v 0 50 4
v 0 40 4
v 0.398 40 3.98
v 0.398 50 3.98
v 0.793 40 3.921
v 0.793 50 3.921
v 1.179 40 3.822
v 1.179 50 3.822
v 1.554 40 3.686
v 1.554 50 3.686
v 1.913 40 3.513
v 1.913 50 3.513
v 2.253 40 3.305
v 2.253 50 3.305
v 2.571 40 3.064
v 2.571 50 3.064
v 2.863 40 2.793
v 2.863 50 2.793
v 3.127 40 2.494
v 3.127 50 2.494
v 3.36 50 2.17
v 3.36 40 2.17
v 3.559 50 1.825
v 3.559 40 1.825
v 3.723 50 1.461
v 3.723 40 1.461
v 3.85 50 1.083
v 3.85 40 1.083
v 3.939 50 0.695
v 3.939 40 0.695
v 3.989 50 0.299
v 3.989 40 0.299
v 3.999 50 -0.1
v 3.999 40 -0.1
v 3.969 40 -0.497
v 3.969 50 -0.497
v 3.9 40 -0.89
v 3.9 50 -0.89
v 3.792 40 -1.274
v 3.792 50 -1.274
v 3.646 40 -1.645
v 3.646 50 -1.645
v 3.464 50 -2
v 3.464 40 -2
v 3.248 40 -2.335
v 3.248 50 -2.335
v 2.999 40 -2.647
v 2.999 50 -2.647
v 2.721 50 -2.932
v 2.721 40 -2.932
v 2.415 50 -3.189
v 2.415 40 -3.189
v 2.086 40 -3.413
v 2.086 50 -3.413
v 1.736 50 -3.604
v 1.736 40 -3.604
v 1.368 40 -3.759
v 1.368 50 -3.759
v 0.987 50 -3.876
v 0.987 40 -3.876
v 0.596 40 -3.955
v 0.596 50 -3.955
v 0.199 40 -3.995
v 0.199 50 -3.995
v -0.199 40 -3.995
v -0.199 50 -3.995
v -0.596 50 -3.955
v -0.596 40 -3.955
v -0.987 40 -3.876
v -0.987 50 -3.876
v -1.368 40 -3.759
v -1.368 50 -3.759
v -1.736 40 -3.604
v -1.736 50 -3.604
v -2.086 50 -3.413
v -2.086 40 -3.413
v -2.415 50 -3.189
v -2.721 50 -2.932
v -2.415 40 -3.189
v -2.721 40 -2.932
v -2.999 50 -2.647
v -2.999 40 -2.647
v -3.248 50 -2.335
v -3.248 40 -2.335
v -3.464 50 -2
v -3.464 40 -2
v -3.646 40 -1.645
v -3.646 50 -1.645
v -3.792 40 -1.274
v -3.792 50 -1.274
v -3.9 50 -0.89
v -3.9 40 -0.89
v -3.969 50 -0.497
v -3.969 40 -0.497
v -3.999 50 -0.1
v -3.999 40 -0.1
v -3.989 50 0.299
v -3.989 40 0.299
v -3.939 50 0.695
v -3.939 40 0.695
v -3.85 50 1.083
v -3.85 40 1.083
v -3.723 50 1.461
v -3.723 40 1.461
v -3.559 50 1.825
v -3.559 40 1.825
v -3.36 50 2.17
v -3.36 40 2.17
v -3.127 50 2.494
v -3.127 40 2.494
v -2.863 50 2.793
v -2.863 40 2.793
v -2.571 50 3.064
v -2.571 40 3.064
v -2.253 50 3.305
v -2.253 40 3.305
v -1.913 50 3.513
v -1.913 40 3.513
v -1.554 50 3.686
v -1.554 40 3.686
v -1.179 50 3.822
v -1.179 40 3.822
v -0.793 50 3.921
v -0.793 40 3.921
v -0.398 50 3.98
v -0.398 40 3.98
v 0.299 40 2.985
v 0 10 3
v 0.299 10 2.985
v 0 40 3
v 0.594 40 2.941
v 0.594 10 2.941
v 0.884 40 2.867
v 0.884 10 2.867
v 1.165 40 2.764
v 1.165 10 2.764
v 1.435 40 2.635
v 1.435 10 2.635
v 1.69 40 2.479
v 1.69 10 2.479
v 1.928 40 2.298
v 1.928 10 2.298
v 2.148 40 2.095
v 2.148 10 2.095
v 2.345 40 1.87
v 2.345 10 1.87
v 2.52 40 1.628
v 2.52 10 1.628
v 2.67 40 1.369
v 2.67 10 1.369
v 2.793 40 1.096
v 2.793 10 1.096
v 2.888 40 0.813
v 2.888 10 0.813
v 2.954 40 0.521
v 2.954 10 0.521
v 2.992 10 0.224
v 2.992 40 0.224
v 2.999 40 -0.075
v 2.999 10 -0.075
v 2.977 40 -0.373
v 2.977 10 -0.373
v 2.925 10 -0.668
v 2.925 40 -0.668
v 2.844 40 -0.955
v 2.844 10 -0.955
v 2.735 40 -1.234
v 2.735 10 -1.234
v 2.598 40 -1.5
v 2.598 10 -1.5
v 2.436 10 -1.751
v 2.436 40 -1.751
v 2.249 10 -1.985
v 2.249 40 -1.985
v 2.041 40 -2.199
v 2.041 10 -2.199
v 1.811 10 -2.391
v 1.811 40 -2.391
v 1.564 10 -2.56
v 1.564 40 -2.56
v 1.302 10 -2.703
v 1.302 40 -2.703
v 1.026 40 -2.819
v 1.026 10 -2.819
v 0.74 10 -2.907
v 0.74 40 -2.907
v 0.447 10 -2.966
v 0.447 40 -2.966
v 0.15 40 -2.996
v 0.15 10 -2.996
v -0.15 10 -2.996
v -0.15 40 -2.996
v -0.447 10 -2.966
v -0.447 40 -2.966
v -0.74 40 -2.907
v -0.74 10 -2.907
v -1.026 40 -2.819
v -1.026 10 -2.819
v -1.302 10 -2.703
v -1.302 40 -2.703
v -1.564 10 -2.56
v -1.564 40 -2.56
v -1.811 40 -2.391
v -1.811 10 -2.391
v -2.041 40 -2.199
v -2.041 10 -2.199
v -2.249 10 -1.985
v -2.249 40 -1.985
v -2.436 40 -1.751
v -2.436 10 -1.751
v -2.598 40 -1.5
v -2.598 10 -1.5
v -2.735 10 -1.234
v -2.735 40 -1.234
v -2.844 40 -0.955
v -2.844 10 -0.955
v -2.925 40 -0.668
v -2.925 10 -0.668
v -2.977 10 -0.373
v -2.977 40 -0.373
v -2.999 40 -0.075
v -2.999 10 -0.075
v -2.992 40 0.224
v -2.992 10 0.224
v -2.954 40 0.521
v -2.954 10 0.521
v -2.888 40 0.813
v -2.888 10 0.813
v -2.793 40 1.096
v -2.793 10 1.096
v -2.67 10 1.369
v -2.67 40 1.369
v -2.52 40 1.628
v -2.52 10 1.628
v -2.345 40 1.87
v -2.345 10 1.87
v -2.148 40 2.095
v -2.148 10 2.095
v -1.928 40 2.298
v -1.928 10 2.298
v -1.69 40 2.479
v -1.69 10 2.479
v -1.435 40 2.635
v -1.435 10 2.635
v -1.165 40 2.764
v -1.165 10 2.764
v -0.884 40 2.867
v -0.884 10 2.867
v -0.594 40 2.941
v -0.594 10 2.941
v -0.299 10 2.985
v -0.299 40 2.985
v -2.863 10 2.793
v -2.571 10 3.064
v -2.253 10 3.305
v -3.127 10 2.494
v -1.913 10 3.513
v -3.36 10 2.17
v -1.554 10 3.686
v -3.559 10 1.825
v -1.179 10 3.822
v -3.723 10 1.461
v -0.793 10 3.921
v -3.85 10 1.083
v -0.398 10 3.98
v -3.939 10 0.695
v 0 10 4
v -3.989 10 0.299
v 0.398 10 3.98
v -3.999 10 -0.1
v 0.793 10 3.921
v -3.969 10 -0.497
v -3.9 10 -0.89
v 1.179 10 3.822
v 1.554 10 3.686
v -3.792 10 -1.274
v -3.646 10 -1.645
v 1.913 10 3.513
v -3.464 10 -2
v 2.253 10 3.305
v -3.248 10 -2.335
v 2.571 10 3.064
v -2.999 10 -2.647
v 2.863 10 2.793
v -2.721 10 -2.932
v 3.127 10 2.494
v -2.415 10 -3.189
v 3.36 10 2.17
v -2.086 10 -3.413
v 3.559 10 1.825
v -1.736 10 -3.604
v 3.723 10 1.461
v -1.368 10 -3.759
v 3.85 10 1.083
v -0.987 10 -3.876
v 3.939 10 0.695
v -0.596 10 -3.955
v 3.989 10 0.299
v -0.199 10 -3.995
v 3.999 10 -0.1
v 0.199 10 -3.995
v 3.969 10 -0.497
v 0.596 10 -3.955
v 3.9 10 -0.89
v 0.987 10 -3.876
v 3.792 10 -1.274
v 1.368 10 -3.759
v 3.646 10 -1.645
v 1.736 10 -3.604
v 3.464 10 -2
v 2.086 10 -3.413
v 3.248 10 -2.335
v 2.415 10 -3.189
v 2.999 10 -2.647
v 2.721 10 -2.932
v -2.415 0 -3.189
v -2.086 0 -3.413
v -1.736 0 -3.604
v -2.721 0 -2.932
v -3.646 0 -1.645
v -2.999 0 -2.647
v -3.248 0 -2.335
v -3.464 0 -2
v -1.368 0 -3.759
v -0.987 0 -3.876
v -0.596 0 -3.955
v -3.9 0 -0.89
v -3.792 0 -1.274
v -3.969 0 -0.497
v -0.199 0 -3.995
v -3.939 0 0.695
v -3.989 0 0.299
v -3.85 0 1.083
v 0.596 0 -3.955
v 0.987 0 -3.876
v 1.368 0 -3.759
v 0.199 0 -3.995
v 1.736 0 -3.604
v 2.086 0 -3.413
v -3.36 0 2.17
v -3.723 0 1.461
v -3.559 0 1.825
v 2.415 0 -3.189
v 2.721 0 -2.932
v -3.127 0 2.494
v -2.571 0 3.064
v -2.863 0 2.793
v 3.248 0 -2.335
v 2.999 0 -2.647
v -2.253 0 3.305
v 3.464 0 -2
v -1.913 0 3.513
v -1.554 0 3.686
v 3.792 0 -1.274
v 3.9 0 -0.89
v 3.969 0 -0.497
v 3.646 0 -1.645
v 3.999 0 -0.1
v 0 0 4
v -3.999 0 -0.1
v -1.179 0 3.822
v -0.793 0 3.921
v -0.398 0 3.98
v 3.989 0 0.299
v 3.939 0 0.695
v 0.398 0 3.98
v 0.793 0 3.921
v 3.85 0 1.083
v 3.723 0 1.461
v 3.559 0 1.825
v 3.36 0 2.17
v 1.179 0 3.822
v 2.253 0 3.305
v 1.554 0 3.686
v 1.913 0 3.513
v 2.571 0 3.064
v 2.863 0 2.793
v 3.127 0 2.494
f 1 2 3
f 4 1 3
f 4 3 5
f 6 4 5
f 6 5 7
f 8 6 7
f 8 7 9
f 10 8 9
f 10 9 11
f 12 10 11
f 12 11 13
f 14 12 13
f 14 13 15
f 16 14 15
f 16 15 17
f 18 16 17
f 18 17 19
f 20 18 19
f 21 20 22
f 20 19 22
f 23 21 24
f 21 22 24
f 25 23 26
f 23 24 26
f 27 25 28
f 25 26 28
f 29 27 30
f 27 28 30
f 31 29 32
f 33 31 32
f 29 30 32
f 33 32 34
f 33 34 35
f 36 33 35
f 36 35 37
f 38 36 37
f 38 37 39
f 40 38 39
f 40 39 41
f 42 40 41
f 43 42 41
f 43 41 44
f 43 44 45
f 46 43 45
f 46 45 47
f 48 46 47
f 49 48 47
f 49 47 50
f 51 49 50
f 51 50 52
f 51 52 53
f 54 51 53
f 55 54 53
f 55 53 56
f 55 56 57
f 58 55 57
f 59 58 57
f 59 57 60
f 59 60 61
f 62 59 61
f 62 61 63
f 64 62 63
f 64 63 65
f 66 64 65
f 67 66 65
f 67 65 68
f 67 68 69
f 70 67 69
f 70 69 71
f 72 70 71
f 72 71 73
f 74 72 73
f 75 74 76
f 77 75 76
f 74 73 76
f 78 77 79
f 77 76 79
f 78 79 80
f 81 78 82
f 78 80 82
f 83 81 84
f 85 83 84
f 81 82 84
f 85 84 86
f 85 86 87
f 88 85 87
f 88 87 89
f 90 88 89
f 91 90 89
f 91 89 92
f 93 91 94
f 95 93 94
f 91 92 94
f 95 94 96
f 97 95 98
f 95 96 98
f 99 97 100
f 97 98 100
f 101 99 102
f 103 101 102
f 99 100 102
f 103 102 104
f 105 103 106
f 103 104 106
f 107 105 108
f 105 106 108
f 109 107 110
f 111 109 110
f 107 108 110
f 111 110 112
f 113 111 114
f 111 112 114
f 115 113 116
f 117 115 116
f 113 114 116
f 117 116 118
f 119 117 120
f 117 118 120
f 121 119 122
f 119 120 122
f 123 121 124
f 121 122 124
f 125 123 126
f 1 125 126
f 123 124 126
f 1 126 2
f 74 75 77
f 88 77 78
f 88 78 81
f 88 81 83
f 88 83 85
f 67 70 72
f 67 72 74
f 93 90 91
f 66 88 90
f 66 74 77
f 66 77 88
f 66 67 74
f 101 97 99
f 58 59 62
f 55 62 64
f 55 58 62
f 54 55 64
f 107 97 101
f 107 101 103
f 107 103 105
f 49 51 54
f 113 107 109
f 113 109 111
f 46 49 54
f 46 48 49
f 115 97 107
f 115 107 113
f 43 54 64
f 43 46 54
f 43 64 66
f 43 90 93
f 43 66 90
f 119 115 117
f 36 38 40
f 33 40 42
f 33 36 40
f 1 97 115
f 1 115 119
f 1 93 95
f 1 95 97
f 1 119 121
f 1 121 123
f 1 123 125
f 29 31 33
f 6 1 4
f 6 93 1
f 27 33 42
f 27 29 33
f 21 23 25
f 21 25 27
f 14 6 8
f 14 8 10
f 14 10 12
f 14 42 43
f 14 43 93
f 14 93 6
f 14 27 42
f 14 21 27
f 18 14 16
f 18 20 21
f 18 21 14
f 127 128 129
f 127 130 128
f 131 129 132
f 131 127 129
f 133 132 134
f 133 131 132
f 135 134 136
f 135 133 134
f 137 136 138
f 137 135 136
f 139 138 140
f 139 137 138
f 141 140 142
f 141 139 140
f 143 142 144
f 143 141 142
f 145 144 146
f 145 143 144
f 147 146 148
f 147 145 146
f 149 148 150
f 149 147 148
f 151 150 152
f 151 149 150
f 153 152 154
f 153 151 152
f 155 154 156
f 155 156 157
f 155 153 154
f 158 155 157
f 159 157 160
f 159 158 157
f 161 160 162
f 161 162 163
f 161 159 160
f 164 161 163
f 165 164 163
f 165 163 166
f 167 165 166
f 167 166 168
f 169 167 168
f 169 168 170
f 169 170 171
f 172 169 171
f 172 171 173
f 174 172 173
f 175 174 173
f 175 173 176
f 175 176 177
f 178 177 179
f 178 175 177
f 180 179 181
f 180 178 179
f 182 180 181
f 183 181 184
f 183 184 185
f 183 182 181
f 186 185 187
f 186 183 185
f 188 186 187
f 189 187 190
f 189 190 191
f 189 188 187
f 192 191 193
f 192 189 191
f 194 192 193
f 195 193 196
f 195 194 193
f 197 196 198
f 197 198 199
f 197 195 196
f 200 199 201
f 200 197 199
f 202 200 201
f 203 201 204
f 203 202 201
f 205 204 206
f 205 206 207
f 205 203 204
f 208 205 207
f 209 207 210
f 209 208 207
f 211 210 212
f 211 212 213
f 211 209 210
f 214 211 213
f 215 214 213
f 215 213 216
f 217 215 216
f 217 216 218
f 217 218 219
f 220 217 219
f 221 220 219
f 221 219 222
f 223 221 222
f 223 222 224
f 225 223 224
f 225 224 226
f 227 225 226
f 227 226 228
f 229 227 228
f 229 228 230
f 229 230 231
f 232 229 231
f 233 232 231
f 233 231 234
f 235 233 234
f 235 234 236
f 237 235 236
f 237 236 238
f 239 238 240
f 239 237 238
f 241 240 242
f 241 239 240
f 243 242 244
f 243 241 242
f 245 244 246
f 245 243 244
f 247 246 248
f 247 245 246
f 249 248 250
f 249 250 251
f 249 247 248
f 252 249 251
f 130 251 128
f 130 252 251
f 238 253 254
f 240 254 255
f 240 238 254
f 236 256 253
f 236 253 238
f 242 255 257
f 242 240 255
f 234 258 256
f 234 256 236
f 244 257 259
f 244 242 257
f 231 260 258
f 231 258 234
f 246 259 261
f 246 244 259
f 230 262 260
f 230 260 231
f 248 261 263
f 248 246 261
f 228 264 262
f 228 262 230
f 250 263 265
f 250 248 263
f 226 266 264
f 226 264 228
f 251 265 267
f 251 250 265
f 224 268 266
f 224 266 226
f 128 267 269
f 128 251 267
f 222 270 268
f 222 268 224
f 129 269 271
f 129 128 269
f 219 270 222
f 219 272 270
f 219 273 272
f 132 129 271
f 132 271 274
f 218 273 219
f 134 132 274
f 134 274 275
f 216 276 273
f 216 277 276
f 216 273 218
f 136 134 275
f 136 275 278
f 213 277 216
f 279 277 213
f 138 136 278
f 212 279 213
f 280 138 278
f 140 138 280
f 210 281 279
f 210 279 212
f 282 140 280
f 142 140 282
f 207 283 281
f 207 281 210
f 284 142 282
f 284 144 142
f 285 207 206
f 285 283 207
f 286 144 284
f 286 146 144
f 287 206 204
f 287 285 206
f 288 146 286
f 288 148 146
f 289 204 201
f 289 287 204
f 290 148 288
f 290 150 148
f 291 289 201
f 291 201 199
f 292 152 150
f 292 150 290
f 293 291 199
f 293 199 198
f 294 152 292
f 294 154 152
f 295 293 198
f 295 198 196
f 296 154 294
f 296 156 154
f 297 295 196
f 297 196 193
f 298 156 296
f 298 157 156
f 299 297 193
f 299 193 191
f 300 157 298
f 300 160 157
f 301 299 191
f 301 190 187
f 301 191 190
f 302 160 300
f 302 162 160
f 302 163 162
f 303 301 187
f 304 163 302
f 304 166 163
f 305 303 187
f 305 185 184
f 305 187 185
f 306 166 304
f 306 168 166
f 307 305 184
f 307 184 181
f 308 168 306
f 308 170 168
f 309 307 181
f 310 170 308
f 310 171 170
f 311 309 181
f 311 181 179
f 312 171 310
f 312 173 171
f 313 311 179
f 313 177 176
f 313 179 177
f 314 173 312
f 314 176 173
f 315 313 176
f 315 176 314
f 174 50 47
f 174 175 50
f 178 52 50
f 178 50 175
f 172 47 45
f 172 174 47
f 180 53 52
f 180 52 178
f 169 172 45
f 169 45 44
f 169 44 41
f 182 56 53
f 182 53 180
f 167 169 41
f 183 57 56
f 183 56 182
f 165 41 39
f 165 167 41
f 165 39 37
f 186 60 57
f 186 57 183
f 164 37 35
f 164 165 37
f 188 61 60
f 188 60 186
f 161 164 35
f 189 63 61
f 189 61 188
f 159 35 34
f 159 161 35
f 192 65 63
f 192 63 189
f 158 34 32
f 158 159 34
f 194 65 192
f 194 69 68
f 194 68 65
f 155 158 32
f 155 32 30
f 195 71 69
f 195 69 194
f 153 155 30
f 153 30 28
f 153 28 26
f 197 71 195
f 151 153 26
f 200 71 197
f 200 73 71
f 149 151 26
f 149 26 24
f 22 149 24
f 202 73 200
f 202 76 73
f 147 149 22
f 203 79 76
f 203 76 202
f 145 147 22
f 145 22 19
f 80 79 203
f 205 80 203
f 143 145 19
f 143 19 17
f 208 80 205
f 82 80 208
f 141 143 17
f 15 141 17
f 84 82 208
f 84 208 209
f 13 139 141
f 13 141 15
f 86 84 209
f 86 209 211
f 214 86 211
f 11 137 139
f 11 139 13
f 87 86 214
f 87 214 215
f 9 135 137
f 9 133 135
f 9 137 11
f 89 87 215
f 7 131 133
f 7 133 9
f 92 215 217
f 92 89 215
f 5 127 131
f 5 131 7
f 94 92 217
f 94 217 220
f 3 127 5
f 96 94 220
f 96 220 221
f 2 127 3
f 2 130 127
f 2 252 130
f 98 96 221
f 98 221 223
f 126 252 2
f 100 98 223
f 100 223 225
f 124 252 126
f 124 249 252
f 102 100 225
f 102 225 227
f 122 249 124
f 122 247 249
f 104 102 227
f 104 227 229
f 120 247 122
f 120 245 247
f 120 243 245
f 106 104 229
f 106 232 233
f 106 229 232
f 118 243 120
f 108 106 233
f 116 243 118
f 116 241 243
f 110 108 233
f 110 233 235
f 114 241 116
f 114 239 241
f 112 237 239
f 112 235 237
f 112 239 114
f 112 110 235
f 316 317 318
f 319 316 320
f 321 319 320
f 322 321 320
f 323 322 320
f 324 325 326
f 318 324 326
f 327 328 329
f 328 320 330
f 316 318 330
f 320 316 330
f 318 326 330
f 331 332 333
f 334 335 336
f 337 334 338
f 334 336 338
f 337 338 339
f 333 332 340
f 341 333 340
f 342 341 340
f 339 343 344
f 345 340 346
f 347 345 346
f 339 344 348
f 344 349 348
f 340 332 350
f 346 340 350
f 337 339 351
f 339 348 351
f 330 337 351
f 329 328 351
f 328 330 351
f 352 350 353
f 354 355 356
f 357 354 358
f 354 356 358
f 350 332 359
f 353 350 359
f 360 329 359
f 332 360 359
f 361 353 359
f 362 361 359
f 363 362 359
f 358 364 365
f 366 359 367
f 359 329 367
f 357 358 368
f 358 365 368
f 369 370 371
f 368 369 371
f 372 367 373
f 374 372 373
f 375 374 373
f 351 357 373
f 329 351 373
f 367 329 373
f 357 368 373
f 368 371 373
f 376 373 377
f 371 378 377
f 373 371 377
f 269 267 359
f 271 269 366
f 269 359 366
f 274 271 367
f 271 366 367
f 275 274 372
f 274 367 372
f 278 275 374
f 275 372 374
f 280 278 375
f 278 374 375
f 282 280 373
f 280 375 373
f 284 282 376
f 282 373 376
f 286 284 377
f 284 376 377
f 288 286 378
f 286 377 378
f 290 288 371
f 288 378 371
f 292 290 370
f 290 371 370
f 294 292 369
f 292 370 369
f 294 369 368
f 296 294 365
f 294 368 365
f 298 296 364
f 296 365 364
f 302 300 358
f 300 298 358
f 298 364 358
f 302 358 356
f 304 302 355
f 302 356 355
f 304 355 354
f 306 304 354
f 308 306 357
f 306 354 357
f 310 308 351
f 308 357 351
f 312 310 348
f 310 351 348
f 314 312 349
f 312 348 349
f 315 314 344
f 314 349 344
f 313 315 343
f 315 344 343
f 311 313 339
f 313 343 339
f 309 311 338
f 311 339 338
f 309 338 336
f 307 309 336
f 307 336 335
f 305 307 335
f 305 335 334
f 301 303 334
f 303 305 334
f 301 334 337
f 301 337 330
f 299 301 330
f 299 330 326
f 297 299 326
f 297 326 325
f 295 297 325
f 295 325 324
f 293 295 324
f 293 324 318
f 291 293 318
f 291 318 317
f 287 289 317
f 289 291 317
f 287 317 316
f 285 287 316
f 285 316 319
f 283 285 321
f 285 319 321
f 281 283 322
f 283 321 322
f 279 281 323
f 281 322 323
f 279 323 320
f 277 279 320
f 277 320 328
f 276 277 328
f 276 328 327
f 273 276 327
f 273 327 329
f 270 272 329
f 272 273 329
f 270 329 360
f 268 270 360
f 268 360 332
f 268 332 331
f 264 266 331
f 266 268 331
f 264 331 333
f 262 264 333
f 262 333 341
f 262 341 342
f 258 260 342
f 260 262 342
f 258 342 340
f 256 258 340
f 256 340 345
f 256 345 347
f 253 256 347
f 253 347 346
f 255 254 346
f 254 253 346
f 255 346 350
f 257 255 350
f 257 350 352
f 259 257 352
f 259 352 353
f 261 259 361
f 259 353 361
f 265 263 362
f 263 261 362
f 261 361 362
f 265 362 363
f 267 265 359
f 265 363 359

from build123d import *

# Parameters (mm, degrees)
SKETCH1_R           = 4
BOSS_EXTRUDE1_DEPTH = 50
SKETCH2_R           = 5.534283494
SKETCH2_R_2         = 3
CUT_EXTRUDE1_DEPTH  = 15
SKETCH4_R           = 4
SKETCH4_R_2         = 3
CUT_EXTRUDE2_DEPTH  = 15


with BuildPart() as part:
    # Sketch1 → Boss-Extrude1 (new body)
    with BuildSketch(Plane(origin=(0, 0, 0), x_dir=(1, 0, 0), z_dir=(0, 1, 0))):
        with Locations(Location((0, 0, 0), (0, 0, 270))):
            Circle(SKETCH1_R)
    extrude(amount=BOSS_EXTRUDE1_DEPTH)

    # Sketch2 → Cut-Extrude1 (cut)
    with BuildSketch(Plane(origin=(0, 25, 0), x_dir=(1, 0, 0), z_dir=(0, 1, 0))):
        Circle(SKETCH2_R)
        with Locations(Location((0, 0, 0), (0, 0, 270))):
            Circle(SKETCH2_R_2, mode=Mode.SUBTRACT)
    extrude(amount=-CUT_EXTRUDE1_DEPTH, mode=Mode.SUBTRACT)

    # Sketch4 → Cut-Extrude2 (cut)
    with BuildSketch(Plane.XZ.offset(-25)):
        with Locations(Location((0, 0, 0), (0, 0, 90))):
            Circle(SKETCH4_R)
        with Locations(Location((0, 0, 0), (0, 0, 90))):
            Circle(SKETCH4_R_2, mode=Mode.SUBTRACT)
    extrude(amount=-CUT_EXTRUDE2_DEPTH, mode=Mode.SUBTRACT)


solid = part.part
